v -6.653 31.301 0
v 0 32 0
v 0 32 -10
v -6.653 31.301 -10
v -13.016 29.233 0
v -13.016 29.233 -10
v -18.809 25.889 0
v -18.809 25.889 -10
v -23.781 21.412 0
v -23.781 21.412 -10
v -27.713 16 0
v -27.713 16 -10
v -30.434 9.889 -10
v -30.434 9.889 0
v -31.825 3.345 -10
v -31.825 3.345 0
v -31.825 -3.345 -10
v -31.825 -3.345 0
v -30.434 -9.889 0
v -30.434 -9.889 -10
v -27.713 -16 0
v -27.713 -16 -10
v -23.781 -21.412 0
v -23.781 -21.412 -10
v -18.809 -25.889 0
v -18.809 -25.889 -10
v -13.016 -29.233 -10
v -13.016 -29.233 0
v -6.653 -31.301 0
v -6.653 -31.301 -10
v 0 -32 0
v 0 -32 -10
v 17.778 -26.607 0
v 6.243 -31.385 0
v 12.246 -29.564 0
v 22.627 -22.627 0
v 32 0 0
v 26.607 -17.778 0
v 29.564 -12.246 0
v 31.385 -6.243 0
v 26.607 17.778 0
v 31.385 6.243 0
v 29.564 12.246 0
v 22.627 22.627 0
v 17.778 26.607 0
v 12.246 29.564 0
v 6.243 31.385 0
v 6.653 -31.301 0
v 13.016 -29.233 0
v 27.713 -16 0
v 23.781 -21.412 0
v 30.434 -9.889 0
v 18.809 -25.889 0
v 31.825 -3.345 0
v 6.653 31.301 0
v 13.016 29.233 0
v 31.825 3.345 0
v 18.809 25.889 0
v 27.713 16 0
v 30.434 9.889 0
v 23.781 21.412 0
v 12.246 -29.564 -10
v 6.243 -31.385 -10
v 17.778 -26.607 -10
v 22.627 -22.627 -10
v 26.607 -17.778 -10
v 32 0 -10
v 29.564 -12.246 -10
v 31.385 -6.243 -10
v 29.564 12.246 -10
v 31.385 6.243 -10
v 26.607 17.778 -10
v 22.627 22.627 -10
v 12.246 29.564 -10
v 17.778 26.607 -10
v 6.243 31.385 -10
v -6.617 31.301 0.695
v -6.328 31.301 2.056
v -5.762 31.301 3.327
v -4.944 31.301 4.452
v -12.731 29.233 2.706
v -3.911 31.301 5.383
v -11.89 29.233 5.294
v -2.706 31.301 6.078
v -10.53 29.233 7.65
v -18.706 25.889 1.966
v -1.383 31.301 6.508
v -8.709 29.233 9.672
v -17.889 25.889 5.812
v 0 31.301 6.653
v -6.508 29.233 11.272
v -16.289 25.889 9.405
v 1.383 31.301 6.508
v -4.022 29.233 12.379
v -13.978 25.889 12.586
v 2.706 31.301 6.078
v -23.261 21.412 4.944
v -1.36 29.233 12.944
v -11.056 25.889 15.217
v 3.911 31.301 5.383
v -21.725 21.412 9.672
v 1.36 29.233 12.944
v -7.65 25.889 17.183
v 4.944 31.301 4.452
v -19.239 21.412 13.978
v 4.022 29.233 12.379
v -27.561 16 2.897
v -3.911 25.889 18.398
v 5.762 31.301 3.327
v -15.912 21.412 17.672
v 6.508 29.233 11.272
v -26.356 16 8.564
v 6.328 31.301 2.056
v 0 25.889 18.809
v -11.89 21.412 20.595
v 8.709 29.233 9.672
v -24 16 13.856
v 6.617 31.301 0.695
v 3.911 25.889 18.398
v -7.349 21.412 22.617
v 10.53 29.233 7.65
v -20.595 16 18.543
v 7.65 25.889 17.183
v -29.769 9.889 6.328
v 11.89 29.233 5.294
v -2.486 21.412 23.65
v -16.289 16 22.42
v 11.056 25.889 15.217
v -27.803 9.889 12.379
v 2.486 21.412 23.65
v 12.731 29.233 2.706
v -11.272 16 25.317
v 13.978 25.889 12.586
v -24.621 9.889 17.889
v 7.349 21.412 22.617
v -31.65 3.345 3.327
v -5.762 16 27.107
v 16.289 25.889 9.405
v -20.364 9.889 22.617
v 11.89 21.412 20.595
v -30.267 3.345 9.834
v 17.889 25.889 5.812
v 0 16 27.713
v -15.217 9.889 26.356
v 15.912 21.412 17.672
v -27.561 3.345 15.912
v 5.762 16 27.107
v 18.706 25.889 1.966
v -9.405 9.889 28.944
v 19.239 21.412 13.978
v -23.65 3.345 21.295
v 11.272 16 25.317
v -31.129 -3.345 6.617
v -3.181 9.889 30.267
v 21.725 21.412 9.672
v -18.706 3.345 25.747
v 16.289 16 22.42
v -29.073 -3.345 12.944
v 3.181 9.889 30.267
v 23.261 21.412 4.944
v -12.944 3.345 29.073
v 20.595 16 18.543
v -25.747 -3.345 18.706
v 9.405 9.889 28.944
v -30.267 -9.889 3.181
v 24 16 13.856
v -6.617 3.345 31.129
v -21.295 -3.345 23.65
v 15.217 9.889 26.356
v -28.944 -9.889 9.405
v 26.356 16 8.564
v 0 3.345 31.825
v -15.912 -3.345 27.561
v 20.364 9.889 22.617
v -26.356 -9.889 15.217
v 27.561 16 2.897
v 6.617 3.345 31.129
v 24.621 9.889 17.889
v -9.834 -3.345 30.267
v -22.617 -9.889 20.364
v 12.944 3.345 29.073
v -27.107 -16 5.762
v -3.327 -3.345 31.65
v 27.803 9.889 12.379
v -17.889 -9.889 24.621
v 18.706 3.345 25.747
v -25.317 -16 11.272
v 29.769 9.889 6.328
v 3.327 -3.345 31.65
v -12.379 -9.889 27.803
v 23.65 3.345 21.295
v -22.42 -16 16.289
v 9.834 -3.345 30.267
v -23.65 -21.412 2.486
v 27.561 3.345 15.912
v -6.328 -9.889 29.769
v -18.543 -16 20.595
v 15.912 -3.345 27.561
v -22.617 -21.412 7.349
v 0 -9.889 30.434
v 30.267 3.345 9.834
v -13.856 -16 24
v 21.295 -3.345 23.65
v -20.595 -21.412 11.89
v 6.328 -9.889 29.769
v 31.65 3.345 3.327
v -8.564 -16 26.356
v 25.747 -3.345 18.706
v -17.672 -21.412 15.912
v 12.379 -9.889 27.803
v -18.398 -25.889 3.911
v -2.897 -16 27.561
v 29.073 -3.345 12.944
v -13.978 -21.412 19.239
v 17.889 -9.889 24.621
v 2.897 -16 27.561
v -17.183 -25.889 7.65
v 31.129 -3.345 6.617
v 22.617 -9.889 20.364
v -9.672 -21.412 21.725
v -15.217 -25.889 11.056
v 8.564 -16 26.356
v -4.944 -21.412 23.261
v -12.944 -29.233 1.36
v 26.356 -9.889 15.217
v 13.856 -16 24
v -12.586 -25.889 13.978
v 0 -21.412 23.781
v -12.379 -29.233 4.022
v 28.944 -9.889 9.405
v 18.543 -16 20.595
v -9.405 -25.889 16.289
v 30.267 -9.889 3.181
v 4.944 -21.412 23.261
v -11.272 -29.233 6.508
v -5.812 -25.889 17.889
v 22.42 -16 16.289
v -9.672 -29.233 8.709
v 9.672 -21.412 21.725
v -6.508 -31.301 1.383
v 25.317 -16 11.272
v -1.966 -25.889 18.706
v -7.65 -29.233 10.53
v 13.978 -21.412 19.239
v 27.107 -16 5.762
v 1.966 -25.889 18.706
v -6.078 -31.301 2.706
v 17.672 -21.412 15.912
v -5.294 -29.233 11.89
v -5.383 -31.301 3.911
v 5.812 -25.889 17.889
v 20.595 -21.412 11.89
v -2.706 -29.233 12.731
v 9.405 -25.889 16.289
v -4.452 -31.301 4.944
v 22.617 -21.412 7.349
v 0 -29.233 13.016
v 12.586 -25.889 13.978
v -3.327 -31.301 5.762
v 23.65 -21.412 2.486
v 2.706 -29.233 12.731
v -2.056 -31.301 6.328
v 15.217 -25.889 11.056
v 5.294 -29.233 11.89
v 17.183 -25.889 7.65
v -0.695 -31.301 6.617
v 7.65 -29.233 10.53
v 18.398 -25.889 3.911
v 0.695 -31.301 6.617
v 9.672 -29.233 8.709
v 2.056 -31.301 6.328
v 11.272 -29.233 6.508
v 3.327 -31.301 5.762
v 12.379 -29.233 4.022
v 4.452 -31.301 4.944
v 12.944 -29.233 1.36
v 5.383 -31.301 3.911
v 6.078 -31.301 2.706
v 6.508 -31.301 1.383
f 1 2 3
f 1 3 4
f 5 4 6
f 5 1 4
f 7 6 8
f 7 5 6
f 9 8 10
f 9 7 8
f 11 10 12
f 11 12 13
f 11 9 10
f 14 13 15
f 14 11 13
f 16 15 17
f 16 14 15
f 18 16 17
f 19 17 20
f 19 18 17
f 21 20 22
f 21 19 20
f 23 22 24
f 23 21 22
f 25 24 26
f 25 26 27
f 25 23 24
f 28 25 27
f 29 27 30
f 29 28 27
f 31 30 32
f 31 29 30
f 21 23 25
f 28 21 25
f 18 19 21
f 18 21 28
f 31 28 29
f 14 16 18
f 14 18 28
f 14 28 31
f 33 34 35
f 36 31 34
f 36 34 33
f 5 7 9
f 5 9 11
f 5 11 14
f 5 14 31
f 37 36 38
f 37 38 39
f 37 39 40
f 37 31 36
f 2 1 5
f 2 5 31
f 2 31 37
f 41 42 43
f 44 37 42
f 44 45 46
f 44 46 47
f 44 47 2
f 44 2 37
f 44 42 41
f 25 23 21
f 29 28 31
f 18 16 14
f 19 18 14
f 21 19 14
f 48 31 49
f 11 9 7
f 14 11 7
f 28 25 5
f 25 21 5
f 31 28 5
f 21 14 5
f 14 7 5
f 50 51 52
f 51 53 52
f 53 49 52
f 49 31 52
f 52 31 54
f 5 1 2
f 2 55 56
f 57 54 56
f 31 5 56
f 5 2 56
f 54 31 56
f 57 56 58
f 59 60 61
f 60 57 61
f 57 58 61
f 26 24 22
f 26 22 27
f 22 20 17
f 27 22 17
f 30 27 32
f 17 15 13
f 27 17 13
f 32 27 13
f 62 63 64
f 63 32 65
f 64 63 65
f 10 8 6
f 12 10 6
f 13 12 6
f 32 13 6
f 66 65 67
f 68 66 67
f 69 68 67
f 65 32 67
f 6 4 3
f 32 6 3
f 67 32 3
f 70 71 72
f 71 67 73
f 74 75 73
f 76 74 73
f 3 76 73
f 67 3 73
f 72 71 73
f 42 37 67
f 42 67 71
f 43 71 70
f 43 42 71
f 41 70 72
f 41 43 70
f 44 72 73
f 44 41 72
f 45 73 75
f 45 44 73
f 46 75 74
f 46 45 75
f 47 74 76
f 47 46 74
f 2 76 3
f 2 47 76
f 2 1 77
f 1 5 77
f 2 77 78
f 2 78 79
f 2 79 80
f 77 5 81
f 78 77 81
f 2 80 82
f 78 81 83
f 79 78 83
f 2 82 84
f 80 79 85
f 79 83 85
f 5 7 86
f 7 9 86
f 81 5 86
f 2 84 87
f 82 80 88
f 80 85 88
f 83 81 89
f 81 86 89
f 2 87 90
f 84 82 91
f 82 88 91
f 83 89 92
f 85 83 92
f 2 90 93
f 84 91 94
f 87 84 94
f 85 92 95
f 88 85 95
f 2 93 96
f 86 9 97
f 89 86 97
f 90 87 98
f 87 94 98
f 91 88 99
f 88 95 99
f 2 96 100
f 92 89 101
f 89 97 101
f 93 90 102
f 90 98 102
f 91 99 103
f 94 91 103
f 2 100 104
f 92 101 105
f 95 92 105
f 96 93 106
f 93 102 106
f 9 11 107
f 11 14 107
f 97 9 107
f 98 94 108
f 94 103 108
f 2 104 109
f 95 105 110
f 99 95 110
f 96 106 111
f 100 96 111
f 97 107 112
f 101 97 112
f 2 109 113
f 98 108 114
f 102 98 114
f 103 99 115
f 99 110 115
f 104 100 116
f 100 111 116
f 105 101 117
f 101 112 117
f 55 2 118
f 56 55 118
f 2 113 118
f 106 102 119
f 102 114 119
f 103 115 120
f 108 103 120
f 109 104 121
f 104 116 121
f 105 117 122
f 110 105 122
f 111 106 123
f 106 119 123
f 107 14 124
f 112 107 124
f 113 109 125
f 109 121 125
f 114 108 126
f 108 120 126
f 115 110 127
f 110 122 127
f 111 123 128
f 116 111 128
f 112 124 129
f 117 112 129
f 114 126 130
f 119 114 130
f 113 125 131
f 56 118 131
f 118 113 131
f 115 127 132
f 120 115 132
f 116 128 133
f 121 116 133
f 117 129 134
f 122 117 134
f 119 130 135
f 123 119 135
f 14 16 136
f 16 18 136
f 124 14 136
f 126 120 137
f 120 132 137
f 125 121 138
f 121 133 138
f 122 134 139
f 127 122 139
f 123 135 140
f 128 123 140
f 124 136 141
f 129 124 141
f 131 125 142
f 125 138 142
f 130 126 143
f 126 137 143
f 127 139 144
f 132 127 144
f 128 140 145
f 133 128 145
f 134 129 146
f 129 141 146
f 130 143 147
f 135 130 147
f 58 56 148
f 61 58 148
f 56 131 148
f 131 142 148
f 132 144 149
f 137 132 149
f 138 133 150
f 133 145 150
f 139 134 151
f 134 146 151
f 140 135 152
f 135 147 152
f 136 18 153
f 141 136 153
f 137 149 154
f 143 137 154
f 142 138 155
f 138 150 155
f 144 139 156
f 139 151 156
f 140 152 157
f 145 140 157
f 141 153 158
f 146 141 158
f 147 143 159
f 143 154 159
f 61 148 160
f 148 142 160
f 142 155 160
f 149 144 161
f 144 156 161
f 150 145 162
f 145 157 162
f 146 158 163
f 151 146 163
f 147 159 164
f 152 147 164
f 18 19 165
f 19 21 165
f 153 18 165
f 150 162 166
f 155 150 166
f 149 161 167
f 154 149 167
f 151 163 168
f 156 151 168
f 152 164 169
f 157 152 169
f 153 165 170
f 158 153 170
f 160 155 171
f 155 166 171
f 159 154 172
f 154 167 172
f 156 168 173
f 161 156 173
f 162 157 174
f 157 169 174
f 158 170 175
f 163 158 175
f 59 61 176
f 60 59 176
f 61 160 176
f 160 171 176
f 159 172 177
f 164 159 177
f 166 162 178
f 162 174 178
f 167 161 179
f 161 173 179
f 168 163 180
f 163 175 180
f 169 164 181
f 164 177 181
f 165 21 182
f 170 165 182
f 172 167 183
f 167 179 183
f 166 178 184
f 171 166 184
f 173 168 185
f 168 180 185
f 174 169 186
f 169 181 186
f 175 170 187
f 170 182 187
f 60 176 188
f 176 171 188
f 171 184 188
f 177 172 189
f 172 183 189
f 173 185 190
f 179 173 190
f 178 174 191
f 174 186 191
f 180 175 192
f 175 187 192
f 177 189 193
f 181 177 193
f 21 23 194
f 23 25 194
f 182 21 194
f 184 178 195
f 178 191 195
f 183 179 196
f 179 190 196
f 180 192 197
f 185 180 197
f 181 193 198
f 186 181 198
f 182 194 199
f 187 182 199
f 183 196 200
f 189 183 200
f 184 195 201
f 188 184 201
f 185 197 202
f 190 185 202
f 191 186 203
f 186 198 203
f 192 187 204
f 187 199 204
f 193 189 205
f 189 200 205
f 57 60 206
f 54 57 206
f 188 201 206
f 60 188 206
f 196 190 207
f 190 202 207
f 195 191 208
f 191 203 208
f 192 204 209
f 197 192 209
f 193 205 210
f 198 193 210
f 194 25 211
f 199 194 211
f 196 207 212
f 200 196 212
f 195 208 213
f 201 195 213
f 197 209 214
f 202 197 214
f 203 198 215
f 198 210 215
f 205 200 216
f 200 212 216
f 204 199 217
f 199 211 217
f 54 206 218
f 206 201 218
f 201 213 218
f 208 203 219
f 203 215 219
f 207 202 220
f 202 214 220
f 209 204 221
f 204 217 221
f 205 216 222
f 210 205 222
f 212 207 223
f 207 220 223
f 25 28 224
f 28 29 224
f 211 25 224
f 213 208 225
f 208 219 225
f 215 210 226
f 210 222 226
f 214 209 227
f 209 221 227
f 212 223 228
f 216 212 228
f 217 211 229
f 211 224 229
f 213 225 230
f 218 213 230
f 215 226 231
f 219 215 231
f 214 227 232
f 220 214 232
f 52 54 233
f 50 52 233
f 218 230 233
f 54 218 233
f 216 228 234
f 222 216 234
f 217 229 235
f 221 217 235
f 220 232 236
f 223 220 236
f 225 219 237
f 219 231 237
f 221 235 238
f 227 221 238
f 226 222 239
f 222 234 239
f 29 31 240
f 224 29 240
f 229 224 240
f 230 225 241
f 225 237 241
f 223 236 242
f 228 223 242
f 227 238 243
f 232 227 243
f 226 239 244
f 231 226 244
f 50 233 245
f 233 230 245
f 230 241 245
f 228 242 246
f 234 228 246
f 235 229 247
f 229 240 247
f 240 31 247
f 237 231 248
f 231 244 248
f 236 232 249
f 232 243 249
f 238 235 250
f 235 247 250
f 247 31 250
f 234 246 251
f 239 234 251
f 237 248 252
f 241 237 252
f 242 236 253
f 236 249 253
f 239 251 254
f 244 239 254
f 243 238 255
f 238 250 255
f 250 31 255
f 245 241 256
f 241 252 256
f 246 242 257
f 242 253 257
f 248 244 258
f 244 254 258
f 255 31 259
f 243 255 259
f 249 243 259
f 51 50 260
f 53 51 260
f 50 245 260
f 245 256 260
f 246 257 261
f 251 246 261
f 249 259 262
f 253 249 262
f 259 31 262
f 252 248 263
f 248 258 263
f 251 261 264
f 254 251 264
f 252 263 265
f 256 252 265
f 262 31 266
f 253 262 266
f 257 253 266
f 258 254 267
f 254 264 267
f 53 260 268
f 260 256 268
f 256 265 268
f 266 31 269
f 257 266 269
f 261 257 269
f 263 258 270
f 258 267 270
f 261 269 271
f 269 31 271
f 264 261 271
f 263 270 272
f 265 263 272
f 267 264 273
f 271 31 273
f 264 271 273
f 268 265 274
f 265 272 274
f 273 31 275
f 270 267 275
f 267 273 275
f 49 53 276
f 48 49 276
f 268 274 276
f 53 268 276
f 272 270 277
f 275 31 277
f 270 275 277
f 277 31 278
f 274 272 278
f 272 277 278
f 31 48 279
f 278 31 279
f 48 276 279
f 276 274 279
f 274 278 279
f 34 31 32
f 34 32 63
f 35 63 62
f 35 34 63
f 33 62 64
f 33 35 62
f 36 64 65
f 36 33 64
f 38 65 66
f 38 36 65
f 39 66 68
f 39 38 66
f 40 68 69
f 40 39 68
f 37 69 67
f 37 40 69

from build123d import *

# Parameters (mm, degrees)
F1_DEPTH = 10
F2_ANGLE = 180


with BuildPart() as f1:
    # F0 (on Top) → F1 (new body)
    with BuildSketch(Plane.XY):
        with BuildLine():
            Line((0, -32), (0, 32))
            ThreePointArc((0, 32), (-32, 0), (0, -32))
        make_face()
        with BuildLine():
            ThreePointArc((0, -32), (22.627416998, -22.627416998), (32, 0))
            ThreePointArc((32, 0), (22.627416998, 22.627416998), (0, 32))
            Line((0, 32), (0, -32))
        make_face()
    extrude(amount=-F1_DEPTH)


with BuildPart() as f2:
    # F0 (on Top) → F2 (revolve)
    with BuildSketch(Plane.XY):
        with BuildLine():
            Line((0, -32), (0, 32))
            ThreePointArc((0, 32), (-32, 0), (0, -32))
        make_face()
    revolve(axis=Axis((0, 0, 0), (0, 1, 0)), revolution_arc=F2_ANGLE)


solid = Compound([f1.part, f2.part])
